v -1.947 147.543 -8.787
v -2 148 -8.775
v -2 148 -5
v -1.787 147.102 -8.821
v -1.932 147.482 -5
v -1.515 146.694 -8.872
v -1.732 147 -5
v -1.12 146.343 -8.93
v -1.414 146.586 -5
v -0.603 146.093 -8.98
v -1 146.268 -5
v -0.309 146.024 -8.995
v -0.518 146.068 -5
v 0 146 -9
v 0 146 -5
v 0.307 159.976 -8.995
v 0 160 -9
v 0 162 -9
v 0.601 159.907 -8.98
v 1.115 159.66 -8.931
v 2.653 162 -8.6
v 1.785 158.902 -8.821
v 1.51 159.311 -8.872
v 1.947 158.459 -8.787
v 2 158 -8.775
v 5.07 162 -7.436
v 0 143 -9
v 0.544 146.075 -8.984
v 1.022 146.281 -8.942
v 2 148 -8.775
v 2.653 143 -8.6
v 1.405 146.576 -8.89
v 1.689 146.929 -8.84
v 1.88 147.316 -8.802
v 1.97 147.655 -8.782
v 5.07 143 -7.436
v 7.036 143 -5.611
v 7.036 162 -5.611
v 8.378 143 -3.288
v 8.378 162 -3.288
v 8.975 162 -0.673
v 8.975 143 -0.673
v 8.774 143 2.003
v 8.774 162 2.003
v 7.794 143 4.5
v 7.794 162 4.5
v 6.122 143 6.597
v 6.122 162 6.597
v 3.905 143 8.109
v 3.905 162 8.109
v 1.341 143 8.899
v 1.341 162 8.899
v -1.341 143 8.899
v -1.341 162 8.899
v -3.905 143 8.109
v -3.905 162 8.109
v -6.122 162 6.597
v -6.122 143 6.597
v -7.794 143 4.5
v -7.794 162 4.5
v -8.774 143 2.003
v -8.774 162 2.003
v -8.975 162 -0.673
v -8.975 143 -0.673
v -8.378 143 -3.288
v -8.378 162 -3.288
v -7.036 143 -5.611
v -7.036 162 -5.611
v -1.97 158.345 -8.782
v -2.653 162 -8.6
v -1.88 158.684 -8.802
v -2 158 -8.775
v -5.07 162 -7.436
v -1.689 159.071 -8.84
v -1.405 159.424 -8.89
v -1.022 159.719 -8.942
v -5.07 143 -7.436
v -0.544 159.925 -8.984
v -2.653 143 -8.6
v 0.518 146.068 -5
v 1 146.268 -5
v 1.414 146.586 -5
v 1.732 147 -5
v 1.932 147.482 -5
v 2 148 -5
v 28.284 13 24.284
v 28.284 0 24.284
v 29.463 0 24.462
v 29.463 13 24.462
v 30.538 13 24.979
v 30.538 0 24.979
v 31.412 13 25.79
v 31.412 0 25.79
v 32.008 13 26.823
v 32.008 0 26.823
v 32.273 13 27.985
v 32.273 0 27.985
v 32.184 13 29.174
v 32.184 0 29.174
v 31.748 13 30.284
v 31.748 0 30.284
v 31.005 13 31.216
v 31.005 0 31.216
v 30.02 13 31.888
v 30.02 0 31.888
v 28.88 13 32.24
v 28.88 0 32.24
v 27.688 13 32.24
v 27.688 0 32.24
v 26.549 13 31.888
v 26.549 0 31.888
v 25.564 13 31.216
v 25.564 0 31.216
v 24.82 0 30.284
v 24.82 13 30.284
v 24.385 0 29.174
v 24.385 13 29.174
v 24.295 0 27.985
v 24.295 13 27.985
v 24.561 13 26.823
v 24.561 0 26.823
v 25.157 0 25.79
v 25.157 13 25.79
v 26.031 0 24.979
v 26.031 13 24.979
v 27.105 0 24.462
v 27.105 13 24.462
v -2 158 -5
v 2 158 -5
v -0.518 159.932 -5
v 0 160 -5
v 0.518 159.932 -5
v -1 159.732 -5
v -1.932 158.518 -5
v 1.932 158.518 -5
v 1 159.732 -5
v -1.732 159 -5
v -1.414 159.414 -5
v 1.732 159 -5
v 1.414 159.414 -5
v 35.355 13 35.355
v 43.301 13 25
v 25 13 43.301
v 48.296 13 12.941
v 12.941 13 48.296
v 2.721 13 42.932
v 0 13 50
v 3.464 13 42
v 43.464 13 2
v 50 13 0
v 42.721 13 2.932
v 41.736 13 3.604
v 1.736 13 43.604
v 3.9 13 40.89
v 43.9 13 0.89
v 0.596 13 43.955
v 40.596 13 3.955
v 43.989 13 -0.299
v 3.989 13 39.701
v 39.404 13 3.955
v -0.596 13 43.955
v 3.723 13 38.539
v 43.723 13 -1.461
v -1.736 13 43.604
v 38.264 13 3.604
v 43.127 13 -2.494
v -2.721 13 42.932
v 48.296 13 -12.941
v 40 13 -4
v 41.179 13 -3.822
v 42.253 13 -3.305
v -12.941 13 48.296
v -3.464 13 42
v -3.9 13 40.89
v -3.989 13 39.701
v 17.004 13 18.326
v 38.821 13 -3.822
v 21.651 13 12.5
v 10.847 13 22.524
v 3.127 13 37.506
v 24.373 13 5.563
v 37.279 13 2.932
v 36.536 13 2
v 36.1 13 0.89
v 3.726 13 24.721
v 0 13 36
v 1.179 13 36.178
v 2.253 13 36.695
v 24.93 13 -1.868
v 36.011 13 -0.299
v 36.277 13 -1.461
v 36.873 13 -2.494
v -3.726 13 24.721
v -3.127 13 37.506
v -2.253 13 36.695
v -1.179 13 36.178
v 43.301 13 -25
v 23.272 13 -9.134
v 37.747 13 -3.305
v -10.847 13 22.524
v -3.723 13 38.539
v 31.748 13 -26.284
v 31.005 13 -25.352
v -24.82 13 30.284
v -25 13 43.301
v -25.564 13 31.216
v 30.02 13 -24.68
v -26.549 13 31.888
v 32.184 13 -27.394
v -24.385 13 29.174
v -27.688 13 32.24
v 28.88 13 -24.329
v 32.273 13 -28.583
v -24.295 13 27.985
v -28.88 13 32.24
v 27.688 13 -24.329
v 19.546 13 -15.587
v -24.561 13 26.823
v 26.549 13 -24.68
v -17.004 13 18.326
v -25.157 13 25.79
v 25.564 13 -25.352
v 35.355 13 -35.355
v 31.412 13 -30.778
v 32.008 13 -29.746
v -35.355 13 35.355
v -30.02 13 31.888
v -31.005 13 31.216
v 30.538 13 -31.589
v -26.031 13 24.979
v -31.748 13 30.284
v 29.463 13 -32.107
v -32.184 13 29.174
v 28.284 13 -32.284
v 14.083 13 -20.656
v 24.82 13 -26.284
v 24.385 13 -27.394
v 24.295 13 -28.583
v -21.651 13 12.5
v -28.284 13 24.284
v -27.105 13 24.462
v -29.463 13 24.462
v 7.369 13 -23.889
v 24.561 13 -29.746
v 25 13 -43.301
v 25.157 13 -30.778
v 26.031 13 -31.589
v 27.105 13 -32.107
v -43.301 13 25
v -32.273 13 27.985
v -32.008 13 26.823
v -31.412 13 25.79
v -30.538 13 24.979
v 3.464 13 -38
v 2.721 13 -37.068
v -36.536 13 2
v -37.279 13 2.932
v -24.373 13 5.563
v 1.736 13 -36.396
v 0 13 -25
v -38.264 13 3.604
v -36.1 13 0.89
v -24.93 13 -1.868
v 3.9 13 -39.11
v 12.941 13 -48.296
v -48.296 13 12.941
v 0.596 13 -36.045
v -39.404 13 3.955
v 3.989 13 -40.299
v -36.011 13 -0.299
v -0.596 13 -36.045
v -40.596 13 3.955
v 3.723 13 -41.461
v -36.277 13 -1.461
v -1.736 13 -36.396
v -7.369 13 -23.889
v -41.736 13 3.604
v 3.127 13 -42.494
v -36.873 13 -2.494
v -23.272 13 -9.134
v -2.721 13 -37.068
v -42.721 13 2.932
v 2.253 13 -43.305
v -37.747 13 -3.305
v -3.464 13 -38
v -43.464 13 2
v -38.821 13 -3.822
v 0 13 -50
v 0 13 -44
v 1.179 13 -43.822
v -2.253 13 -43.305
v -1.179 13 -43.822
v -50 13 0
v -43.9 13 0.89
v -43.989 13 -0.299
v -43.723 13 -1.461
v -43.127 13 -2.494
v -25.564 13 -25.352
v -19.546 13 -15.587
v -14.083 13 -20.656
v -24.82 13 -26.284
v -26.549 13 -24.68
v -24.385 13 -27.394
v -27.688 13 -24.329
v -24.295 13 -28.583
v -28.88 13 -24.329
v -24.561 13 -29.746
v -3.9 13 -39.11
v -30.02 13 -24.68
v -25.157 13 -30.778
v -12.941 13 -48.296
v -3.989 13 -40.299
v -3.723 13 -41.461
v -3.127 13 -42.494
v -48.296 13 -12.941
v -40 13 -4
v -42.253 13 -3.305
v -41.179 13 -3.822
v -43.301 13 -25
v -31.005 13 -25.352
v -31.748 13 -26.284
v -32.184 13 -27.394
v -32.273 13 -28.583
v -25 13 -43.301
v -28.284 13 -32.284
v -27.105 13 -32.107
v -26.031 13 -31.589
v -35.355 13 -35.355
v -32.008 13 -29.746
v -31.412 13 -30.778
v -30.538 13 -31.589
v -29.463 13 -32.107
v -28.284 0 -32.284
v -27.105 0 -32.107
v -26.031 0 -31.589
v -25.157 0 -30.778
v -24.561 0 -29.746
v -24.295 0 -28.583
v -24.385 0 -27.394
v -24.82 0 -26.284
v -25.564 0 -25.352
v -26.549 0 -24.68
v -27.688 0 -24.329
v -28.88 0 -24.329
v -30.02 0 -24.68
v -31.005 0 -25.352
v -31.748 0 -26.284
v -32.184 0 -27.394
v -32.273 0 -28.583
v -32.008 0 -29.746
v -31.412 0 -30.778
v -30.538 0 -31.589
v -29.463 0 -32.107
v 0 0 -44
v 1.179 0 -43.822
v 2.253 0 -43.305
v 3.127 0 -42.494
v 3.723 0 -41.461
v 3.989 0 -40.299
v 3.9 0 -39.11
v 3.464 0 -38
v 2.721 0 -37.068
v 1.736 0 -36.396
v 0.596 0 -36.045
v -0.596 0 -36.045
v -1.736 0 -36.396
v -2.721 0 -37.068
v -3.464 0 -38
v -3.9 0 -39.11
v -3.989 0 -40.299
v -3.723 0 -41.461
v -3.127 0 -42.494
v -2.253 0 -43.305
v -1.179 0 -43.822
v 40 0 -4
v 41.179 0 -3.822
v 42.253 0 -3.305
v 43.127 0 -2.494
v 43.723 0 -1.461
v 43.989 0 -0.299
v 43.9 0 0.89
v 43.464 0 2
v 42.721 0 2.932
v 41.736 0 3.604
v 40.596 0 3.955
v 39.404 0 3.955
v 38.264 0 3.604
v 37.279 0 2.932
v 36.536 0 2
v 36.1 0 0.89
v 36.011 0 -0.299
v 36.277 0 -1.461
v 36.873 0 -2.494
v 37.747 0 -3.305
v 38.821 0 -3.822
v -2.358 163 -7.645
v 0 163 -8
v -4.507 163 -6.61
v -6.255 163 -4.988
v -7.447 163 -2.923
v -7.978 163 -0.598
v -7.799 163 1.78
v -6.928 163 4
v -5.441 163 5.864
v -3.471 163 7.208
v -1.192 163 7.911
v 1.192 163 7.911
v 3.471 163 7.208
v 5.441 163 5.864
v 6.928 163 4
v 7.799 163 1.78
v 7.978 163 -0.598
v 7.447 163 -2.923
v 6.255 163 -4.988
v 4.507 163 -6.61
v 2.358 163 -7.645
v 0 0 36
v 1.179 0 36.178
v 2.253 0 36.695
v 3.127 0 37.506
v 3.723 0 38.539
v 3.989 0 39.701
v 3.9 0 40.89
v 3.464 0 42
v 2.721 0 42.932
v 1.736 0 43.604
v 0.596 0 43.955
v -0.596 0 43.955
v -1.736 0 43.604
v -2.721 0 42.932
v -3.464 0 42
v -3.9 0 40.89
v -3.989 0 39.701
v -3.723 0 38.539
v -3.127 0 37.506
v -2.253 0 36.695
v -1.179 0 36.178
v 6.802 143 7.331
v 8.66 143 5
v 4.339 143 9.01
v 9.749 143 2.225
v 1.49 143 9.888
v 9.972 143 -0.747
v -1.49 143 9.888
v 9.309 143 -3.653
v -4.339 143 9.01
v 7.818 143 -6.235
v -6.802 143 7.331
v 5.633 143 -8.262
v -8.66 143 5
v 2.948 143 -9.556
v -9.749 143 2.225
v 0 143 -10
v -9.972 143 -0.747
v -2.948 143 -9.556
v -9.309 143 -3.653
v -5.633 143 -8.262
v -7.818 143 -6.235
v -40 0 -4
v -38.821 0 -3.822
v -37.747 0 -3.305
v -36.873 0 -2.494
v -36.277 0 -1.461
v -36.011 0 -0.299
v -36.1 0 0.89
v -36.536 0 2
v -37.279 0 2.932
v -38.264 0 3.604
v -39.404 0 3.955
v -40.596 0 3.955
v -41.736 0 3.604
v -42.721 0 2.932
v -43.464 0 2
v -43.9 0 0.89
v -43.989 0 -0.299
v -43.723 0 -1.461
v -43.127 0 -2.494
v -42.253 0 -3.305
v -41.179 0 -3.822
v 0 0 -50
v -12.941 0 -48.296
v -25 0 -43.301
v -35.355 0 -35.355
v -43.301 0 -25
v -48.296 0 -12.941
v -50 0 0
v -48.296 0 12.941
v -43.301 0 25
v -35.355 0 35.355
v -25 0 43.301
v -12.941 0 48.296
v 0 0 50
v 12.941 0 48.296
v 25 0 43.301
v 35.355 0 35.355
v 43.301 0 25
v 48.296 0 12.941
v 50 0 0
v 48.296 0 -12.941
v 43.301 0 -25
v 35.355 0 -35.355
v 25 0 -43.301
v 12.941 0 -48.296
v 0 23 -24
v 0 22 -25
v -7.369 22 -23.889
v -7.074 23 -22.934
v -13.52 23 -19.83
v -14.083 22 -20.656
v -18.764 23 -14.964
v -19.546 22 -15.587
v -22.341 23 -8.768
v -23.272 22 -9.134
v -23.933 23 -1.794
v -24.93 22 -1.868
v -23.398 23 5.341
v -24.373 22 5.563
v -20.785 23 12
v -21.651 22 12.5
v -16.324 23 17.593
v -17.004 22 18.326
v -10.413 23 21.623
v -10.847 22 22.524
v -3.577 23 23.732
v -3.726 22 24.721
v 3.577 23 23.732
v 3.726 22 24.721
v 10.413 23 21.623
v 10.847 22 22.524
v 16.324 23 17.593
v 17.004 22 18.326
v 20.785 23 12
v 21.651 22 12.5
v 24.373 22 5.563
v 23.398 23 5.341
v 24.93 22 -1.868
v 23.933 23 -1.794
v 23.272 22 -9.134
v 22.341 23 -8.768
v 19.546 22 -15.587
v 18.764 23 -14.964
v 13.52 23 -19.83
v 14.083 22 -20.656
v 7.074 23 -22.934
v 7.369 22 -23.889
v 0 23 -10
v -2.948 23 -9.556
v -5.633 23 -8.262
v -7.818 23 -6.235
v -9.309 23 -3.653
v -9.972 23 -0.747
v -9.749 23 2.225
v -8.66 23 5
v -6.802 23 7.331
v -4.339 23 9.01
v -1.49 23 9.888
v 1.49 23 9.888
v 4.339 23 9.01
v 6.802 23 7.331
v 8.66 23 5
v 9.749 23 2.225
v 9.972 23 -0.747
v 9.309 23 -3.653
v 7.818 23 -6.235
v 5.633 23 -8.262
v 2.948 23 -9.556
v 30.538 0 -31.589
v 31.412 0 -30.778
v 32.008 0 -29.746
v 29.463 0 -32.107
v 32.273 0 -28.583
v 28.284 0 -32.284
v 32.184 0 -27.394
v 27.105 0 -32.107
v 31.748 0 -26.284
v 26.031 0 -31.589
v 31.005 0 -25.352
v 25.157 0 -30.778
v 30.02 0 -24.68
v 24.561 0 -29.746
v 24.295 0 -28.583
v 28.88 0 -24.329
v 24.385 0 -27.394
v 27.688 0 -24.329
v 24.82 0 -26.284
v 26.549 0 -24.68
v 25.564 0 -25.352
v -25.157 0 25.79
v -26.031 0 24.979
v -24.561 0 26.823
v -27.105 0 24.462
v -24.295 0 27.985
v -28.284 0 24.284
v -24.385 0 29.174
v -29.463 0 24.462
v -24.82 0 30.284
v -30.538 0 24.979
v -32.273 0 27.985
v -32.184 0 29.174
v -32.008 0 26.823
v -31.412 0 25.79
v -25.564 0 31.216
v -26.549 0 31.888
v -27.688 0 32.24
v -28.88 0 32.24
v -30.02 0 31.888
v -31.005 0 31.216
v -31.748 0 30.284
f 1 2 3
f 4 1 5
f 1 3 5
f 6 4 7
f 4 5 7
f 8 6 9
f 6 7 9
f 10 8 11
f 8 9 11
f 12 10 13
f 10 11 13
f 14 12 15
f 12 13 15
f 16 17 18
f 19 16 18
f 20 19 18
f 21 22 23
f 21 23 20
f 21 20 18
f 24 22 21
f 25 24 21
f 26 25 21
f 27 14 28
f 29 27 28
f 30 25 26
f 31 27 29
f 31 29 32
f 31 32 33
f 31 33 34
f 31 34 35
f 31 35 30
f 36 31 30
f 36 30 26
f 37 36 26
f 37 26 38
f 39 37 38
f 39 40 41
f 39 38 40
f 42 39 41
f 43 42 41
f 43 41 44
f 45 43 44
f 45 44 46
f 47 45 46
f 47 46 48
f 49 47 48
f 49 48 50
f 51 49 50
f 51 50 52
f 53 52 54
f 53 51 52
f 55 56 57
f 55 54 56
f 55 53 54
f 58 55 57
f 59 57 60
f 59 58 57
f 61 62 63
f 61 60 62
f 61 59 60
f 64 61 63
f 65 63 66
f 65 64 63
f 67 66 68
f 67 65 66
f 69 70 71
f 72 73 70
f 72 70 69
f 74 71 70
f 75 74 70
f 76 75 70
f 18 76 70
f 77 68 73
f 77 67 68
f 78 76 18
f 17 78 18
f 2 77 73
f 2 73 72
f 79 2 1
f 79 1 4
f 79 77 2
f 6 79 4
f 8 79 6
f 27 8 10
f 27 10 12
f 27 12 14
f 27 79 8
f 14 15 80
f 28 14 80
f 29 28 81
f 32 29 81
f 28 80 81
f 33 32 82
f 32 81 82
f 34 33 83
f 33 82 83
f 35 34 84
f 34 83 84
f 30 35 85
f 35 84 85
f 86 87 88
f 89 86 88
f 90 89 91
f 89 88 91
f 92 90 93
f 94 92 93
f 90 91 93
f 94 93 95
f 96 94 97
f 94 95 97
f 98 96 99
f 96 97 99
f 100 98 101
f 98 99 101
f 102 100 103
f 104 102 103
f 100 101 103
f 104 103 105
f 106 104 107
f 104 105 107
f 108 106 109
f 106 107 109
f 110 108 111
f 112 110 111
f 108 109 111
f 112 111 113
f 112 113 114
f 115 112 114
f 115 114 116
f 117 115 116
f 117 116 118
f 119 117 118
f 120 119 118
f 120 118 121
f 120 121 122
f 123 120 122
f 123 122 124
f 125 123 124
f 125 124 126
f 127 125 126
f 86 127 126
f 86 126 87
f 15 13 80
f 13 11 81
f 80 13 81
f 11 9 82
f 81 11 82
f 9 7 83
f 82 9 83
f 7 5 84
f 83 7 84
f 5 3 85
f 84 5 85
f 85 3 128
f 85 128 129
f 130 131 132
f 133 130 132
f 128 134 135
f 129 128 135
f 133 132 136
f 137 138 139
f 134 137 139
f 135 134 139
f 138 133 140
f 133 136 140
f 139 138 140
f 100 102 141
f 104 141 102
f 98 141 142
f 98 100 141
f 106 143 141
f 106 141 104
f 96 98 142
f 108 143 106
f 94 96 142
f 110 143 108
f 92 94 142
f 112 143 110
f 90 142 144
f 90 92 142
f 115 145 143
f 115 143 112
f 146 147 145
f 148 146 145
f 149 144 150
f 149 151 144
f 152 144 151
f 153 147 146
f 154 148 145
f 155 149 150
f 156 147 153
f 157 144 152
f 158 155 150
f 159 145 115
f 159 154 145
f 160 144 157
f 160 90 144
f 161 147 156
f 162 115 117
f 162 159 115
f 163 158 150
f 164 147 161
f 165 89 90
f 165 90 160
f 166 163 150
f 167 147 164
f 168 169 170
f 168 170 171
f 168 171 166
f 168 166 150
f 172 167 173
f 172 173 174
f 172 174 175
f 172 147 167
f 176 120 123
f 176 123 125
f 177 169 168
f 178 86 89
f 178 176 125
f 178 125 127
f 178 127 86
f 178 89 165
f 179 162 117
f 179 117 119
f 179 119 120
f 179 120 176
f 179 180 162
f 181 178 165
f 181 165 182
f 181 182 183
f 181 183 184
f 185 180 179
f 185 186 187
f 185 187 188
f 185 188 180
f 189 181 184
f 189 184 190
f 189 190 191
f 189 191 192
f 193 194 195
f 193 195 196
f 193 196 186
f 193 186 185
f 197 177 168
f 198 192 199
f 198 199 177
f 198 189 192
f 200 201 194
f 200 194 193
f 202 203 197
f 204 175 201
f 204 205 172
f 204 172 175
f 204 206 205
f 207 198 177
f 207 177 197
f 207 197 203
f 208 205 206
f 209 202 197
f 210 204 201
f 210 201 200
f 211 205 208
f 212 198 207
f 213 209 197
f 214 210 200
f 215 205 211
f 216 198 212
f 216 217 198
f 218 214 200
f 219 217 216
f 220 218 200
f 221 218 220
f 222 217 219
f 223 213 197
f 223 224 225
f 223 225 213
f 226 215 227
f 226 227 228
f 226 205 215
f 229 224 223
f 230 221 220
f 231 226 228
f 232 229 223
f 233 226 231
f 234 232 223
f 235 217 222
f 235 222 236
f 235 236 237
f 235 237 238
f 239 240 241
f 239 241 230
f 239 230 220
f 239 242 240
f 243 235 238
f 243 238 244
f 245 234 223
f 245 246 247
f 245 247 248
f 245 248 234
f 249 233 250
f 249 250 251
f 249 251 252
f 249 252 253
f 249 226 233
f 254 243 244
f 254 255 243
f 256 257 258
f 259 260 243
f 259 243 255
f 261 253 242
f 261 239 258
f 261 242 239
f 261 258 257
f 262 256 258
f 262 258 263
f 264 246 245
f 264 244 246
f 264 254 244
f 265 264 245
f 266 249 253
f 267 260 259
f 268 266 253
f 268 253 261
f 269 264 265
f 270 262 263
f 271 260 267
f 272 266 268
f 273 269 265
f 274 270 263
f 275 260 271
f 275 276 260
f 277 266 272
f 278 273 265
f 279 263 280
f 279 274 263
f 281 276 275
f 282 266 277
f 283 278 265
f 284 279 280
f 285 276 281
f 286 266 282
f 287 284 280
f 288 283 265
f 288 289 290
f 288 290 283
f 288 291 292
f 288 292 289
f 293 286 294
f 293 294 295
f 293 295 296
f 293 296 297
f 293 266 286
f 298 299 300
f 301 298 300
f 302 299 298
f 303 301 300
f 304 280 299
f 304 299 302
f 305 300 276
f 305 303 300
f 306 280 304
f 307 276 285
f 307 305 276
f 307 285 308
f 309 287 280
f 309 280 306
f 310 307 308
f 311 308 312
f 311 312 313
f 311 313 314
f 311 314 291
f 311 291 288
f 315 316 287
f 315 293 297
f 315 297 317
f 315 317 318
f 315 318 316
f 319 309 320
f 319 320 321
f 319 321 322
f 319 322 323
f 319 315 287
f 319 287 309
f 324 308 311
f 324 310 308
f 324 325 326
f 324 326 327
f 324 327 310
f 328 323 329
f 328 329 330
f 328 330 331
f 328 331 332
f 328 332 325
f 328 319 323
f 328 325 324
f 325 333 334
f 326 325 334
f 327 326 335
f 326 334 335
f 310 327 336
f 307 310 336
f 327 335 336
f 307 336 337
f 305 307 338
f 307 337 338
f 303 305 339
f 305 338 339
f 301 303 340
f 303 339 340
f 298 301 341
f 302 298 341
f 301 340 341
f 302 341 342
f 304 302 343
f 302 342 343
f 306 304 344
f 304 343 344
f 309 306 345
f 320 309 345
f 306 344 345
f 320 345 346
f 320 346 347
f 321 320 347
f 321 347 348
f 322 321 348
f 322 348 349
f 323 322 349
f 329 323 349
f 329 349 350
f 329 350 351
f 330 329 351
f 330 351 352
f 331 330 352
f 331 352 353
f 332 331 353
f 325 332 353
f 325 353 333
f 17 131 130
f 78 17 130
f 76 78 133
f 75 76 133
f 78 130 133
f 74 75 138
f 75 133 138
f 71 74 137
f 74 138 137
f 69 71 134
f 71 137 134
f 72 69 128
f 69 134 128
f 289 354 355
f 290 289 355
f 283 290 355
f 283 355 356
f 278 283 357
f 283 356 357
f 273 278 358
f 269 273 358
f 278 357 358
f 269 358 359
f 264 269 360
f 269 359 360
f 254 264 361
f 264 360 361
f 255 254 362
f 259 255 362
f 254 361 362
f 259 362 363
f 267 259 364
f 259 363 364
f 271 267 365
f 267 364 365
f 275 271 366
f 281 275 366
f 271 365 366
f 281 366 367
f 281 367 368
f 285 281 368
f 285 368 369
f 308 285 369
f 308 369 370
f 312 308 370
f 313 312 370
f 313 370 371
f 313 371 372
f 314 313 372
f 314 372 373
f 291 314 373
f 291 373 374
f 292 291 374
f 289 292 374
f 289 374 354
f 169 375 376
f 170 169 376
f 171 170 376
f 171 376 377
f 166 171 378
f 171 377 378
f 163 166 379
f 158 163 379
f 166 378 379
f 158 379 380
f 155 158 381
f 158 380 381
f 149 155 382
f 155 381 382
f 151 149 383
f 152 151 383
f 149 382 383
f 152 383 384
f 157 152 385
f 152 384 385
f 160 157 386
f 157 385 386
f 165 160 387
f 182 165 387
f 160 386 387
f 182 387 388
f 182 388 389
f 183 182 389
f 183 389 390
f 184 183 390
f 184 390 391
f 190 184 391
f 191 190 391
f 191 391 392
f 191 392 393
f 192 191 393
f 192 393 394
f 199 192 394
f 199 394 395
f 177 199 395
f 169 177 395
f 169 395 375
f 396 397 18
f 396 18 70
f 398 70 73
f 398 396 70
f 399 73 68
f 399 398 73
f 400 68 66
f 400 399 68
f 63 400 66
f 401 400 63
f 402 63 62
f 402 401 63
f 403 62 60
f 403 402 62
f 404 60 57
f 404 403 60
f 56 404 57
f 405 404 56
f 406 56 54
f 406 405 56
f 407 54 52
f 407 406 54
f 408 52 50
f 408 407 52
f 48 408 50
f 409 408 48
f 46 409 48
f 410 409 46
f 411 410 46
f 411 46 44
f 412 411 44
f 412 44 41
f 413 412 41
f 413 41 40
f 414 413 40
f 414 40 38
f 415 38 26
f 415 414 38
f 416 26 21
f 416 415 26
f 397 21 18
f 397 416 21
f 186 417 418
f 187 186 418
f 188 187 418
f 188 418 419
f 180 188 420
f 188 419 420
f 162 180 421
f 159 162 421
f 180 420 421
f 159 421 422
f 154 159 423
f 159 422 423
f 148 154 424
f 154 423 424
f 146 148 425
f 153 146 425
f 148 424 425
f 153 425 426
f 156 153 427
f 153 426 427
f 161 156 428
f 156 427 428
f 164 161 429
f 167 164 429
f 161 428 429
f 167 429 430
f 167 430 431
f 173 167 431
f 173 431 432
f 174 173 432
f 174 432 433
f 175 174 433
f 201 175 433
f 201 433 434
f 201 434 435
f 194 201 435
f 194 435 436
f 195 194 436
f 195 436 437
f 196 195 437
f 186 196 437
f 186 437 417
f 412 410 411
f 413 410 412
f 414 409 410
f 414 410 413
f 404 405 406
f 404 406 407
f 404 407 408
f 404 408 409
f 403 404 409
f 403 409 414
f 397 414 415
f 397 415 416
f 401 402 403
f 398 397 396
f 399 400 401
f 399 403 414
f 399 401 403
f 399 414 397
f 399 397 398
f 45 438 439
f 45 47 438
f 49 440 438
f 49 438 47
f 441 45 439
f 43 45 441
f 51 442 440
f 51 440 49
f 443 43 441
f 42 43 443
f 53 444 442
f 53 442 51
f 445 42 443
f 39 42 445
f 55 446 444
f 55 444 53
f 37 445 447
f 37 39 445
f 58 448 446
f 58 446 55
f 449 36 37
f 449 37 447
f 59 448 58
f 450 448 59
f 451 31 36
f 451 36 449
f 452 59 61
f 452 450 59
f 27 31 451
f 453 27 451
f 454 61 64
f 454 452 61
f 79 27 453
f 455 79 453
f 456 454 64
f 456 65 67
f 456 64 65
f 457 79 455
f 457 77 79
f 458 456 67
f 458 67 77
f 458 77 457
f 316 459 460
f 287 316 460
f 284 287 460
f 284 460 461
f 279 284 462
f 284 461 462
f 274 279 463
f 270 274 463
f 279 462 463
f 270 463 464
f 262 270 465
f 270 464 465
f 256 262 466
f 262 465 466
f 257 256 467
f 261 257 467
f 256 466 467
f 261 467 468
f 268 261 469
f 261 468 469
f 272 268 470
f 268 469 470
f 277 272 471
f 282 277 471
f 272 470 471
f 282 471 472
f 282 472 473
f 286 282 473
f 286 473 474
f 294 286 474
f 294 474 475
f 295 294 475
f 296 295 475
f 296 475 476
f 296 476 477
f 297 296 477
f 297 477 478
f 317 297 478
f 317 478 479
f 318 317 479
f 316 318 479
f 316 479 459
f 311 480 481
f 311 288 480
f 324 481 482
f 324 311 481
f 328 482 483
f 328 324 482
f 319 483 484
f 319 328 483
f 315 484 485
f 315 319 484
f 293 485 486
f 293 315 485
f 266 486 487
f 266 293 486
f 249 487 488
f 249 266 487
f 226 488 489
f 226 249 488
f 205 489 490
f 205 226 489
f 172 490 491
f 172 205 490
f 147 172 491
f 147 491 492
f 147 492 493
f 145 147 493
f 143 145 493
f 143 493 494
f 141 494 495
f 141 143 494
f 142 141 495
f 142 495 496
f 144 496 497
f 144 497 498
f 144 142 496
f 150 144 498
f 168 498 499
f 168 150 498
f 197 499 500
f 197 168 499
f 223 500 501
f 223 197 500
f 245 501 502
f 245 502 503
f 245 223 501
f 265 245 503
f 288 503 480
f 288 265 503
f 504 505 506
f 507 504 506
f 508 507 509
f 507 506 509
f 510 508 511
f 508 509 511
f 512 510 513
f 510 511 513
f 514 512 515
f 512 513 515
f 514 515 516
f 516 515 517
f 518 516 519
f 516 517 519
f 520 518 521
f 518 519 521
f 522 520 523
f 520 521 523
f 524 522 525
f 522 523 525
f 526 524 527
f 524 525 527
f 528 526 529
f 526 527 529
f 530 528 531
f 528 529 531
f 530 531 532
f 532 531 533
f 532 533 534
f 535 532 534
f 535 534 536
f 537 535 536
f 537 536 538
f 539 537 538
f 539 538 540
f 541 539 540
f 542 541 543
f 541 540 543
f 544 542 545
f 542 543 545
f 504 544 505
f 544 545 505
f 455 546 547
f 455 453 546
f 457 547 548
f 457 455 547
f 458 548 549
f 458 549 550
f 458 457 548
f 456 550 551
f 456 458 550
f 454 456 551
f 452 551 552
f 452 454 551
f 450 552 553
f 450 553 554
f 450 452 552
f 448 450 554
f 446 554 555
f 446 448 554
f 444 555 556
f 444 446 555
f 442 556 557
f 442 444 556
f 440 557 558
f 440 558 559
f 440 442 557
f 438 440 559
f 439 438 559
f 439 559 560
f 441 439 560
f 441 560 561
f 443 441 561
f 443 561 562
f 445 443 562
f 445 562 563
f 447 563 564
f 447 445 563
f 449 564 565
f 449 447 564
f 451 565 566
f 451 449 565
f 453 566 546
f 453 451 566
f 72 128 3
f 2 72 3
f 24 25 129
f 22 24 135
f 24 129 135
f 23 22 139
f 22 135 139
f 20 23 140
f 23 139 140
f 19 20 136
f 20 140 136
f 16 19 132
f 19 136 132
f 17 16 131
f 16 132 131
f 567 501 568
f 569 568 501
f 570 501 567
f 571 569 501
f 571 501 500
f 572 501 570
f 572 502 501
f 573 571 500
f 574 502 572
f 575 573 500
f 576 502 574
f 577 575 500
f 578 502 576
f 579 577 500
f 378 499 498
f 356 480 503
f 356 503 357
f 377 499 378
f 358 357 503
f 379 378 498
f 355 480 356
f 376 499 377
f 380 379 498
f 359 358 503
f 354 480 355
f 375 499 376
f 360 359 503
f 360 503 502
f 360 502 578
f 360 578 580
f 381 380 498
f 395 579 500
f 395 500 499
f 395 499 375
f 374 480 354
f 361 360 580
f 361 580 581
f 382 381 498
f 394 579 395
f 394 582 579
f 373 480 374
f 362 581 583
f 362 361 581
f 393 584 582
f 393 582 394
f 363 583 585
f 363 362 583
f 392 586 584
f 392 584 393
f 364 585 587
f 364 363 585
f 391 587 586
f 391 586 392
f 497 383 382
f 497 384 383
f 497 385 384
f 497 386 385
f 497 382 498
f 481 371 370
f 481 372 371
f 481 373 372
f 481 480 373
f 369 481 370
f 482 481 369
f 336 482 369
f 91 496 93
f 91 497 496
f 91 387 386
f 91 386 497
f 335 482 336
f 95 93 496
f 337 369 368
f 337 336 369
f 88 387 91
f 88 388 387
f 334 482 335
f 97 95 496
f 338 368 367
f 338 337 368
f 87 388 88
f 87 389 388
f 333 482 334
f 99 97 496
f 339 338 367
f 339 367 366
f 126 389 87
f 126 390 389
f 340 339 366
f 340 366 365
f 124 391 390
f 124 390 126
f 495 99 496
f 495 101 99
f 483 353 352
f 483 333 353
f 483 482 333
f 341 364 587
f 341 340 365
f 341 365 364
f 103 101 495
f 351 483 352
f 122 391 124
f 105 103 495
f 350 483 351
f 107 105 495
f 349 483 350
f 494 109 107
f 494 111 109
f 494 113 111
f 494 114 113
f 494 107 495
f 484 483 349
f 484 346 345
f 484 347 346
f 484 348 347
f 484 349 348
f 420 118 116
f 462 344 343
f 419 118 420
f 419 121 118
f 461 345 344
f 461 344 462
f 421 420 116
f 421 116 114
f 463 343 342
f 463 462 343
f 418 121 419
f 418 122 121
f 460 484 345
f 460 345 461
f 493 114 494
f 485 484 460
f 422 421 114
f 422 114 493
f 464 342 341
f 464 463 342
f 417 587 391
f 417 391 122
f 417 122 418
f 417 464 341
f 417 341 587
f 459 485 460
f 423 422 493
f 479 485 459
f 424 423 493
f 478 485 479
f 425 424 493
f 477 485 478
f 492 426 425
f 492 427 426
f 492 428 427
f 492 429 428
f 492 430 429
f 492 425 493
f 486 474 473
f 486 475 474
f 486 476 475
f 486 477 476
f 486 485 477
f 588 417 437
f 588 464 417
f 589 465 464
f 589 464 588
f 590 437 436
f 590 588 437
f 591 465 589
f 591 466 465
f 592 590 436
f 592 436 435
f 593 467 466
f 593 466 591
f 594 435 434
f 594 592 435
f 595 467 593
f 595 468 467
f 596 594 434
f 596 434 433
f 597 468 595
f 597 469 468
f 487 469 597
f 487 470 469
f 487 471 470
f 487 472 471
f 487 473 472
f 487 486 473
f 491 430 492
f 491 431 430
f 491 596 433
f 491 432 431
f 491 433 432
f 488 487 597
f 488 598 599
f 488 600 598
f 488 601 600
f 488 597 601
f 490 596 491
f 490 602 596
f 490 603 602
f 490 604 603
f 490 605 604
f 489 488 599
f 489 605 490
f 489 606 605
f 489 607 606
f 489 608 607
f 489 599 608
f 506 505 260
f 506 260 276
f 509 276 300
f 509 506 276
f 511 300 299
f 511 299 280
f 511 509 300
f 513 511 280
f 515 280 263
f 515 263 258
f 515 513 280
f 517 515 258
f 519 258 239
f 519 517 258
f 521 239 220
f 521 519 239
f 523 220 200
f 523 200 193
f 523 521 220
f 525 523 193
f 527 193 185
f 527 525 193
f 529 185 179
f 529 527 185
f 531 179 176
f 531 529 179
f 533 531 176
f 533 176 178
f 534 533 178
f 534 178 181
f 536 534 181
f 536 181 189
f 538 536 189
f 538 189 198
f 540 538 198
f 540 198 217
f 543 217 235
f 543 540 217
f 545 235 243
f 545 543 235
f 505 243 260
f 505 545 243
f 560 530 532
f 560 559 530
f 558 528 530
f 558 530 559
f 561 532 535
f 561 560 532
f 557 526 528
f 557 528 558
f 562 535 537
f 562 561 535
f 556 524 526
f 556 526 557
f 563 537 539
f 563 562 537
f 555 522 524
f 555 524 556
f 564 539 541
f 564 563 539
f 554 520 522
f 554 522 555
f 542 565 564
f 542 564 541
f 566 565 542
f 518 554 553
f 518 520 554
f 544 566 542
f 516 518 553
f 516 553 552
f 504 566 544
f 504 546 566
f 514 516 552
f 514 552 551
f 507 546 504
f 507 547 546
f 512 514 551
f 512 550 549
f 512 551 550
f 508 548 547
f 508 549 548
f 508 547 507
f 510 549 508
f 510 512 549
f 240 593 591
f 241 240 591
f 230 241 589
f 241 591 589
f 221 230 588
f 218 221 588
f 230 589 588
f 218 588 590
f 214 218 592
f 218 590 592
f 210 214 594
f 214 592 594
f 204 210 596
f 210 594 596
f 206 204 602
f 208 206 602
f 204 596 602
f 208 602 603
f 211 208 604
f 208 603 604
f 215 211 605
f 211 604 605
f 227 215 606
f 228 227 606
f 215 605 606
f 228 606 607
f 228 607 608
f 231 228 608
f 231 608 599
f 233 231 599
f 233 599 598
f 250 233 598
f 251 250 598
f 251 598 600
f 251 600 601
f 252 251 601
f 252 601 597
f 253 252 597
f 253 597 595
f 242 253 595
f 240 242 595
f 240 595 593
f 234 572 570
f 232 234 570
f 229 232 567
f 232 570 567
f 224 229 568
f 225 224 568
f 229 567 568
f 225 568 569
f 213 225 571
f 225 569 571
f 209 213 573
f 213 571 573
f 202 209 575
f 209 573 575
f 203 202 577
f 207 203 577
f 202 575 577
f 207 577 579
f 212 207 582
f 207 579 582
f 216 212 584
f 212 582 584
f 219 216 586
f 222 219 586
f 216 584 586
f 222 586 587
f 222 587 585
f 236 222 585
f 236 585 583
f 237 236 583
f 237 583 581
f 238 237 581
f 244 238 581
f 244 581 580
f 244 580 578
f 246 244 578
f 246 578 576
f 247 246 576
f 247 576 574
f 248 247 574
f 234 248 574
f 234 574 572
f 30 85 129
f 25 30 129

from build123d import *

# Parameters (mm, degrees)
CHAMFER1_SIZE            = 1
CHAMFER2_SIZE            = 1
SKETCH3_R                = 4
CUT_EXTRUDE1_DEPTH       = 178.676672639
CUT_EXTRUDE2_START       = -3
CUT_EXTRUDE2_DEPTH       = 14
BOSS_EXTRUDE1_REACH      = 181.148
BOSS_EXTRUDE1_END_RADIUS = 9


with BuildPart() as part:
    # Sketch2 → Revolve1 (revolve)
    with BuildSketch(Plane(origin=(0, 0, 0), x_dir=(0, 0, -1), z_dir=(1, 0, 0))):
        Polygon((0, 0), (50, 0), (50, 13), (25, 13), (25, 23), (10, 23), (10, 143), (9, 143), (9, 163), (0, 163), align=None)
    revolve(axis=Axis((0, 0, 0), (0, 1, 0)))

    # Chamfer1
    chamfer1_edges = [part.edges().sort_by_distance(p)[0] for p in [
        (0, 163, 9),
    ]]
    chamfer(chamfer1_edges, length=CHAMFER1_SIZE)

    # Chamfer2
    chamfer2_edges = [part.edges().sort_by_distance(p)[0] for p in [
        (0, 23, 25),
    ]]
    chamfer(chamfer2_edges, length=CHAMFER2_SIZE)

    # Sketch3 → Cut-Extrude1 (cut, through all)
    with BuildSketch(Plane.XZ):
        with Locations((40, 0)):
            Circle(SKETCH3_R)
        with Locations((28.284271247, 28.284271247)):
            Circle(SKETCH3_R)
        with Locations((28.284271247, -28.284271247)):
            Circle(SKETCH3_R)
        with Locations((0, 40)):
            Circle(SKETCH3_R)
        with Locations((0, -40)):
            Circle(SKETCH3_R)
        with Locations((-28.284271247, 28.284271247)):
            Circle(SKETCH3_R)
        with Locations((-28.284271247, -28.284271247)):
            Circle(SKETCH3_R)
        with Locations((-40, 0)):
            Circle(SKETCH3_R)
    extrude(amount=-CUT_EXTRUDE1_DEPTH, mode=Mode.SUBTRACT)

    # Sketch5 → Cut-Extrude2 (cut)
    with BuildSketch(Plane(origin=(0, 163, 0), x_dir=(1, 0, 0), z_dir=(0, 1, 0)).offset(CUT_EXTRUDE2_START)):
        with BuildLine():
            Line((-3, 5), (3, 5))
            Line((3, 5), (3, 8.485281374))
            ThreePointArc((3, 8.485281374), (0, 9), (-3, 8.485281374))
            Line((-3, 8.485281374), (-3, 5))
        make_face()
    extrude(amount=-CUT_EXTRUDE2_DEPTH, mode=Mode.SUBTRACT)

    # Boss-Extrude1: up to this cylinder (the profile starts inside it)
    boss_extrude1_end = Plane(origin=(0, 153, 0), z_dir=(0, -1, 0)) * Cylinder(BOSS_EXTRUDE1_END_RADIUS, 381.296, mode=Mode.PRIVATE)
    # Sketch6 → Boss-Extrude1 (add, up to the surface)
    with BuildSketch(Plane(origin=(0, 0, -5), x_dir=(-1, 0, 0), z_dir=(0, 0, -1)), mode=Mode.PRIVATE) as boss_extrude1_sk1:
        with BuildLine():
            ThreePointArc((-2, 158), (-1.414213562, 159.414213562), (0, 160))
            Line((0, 160), (-3, 160))
            Line((-3, 160), (-3, 146))
            Line((-3, 146), (0, 146))
            ThreePointArc((0, 146), (-1.414213562, 146.585786438), (-2, 148))
            Line((-2, 148), (-2, 158))
        make_face()
    boss_extrude1_tool1 = extrude(boss_extrude1_sk1.sketch, amount=BOSS_EXTRUDE1_REACH, mode=Mode.PRIVATE) & boss_extrude1_end
    add(boss_extrude1_tool1.solids().sort_by_distance((2.396584, 153, -5))[0])
    # Sketch6 → Boss-Extrude1 (add, up to the surface)
    with BuildSketch(Plane(origin=(0, 0, -5), x_dir=(-1, 0, 0), z_dir=(0, 0, -1)), mode=Mode.PRIVATE) as boss_extrude1_sk2:
        with BuildLine():
            Line((3, 160), (0, 160))
            ThreePointArc((0, 160), (1.414213562, 159.414213562), (2, 158))
            Line((2, 158), (2, 148))
            ThreePointArc((2, 148), (1.414213562, 146.585786438), (0, 146))
            Line((0, 146), (3, 146))
            Line((3, 146), (3, 160))
        make_face()
    boss_extrude1_tool2 = extrude(boss_extrude1_sk2.sketch, amount=BOSS_EXTRUDE1_REACH, mode=Mode.PRIVATE) & boss_extrude1_end
    add(boss_extrude1_tool2.solids().sort_by_distance((-2.396584, 153, -5))[0])


solid = part.part
